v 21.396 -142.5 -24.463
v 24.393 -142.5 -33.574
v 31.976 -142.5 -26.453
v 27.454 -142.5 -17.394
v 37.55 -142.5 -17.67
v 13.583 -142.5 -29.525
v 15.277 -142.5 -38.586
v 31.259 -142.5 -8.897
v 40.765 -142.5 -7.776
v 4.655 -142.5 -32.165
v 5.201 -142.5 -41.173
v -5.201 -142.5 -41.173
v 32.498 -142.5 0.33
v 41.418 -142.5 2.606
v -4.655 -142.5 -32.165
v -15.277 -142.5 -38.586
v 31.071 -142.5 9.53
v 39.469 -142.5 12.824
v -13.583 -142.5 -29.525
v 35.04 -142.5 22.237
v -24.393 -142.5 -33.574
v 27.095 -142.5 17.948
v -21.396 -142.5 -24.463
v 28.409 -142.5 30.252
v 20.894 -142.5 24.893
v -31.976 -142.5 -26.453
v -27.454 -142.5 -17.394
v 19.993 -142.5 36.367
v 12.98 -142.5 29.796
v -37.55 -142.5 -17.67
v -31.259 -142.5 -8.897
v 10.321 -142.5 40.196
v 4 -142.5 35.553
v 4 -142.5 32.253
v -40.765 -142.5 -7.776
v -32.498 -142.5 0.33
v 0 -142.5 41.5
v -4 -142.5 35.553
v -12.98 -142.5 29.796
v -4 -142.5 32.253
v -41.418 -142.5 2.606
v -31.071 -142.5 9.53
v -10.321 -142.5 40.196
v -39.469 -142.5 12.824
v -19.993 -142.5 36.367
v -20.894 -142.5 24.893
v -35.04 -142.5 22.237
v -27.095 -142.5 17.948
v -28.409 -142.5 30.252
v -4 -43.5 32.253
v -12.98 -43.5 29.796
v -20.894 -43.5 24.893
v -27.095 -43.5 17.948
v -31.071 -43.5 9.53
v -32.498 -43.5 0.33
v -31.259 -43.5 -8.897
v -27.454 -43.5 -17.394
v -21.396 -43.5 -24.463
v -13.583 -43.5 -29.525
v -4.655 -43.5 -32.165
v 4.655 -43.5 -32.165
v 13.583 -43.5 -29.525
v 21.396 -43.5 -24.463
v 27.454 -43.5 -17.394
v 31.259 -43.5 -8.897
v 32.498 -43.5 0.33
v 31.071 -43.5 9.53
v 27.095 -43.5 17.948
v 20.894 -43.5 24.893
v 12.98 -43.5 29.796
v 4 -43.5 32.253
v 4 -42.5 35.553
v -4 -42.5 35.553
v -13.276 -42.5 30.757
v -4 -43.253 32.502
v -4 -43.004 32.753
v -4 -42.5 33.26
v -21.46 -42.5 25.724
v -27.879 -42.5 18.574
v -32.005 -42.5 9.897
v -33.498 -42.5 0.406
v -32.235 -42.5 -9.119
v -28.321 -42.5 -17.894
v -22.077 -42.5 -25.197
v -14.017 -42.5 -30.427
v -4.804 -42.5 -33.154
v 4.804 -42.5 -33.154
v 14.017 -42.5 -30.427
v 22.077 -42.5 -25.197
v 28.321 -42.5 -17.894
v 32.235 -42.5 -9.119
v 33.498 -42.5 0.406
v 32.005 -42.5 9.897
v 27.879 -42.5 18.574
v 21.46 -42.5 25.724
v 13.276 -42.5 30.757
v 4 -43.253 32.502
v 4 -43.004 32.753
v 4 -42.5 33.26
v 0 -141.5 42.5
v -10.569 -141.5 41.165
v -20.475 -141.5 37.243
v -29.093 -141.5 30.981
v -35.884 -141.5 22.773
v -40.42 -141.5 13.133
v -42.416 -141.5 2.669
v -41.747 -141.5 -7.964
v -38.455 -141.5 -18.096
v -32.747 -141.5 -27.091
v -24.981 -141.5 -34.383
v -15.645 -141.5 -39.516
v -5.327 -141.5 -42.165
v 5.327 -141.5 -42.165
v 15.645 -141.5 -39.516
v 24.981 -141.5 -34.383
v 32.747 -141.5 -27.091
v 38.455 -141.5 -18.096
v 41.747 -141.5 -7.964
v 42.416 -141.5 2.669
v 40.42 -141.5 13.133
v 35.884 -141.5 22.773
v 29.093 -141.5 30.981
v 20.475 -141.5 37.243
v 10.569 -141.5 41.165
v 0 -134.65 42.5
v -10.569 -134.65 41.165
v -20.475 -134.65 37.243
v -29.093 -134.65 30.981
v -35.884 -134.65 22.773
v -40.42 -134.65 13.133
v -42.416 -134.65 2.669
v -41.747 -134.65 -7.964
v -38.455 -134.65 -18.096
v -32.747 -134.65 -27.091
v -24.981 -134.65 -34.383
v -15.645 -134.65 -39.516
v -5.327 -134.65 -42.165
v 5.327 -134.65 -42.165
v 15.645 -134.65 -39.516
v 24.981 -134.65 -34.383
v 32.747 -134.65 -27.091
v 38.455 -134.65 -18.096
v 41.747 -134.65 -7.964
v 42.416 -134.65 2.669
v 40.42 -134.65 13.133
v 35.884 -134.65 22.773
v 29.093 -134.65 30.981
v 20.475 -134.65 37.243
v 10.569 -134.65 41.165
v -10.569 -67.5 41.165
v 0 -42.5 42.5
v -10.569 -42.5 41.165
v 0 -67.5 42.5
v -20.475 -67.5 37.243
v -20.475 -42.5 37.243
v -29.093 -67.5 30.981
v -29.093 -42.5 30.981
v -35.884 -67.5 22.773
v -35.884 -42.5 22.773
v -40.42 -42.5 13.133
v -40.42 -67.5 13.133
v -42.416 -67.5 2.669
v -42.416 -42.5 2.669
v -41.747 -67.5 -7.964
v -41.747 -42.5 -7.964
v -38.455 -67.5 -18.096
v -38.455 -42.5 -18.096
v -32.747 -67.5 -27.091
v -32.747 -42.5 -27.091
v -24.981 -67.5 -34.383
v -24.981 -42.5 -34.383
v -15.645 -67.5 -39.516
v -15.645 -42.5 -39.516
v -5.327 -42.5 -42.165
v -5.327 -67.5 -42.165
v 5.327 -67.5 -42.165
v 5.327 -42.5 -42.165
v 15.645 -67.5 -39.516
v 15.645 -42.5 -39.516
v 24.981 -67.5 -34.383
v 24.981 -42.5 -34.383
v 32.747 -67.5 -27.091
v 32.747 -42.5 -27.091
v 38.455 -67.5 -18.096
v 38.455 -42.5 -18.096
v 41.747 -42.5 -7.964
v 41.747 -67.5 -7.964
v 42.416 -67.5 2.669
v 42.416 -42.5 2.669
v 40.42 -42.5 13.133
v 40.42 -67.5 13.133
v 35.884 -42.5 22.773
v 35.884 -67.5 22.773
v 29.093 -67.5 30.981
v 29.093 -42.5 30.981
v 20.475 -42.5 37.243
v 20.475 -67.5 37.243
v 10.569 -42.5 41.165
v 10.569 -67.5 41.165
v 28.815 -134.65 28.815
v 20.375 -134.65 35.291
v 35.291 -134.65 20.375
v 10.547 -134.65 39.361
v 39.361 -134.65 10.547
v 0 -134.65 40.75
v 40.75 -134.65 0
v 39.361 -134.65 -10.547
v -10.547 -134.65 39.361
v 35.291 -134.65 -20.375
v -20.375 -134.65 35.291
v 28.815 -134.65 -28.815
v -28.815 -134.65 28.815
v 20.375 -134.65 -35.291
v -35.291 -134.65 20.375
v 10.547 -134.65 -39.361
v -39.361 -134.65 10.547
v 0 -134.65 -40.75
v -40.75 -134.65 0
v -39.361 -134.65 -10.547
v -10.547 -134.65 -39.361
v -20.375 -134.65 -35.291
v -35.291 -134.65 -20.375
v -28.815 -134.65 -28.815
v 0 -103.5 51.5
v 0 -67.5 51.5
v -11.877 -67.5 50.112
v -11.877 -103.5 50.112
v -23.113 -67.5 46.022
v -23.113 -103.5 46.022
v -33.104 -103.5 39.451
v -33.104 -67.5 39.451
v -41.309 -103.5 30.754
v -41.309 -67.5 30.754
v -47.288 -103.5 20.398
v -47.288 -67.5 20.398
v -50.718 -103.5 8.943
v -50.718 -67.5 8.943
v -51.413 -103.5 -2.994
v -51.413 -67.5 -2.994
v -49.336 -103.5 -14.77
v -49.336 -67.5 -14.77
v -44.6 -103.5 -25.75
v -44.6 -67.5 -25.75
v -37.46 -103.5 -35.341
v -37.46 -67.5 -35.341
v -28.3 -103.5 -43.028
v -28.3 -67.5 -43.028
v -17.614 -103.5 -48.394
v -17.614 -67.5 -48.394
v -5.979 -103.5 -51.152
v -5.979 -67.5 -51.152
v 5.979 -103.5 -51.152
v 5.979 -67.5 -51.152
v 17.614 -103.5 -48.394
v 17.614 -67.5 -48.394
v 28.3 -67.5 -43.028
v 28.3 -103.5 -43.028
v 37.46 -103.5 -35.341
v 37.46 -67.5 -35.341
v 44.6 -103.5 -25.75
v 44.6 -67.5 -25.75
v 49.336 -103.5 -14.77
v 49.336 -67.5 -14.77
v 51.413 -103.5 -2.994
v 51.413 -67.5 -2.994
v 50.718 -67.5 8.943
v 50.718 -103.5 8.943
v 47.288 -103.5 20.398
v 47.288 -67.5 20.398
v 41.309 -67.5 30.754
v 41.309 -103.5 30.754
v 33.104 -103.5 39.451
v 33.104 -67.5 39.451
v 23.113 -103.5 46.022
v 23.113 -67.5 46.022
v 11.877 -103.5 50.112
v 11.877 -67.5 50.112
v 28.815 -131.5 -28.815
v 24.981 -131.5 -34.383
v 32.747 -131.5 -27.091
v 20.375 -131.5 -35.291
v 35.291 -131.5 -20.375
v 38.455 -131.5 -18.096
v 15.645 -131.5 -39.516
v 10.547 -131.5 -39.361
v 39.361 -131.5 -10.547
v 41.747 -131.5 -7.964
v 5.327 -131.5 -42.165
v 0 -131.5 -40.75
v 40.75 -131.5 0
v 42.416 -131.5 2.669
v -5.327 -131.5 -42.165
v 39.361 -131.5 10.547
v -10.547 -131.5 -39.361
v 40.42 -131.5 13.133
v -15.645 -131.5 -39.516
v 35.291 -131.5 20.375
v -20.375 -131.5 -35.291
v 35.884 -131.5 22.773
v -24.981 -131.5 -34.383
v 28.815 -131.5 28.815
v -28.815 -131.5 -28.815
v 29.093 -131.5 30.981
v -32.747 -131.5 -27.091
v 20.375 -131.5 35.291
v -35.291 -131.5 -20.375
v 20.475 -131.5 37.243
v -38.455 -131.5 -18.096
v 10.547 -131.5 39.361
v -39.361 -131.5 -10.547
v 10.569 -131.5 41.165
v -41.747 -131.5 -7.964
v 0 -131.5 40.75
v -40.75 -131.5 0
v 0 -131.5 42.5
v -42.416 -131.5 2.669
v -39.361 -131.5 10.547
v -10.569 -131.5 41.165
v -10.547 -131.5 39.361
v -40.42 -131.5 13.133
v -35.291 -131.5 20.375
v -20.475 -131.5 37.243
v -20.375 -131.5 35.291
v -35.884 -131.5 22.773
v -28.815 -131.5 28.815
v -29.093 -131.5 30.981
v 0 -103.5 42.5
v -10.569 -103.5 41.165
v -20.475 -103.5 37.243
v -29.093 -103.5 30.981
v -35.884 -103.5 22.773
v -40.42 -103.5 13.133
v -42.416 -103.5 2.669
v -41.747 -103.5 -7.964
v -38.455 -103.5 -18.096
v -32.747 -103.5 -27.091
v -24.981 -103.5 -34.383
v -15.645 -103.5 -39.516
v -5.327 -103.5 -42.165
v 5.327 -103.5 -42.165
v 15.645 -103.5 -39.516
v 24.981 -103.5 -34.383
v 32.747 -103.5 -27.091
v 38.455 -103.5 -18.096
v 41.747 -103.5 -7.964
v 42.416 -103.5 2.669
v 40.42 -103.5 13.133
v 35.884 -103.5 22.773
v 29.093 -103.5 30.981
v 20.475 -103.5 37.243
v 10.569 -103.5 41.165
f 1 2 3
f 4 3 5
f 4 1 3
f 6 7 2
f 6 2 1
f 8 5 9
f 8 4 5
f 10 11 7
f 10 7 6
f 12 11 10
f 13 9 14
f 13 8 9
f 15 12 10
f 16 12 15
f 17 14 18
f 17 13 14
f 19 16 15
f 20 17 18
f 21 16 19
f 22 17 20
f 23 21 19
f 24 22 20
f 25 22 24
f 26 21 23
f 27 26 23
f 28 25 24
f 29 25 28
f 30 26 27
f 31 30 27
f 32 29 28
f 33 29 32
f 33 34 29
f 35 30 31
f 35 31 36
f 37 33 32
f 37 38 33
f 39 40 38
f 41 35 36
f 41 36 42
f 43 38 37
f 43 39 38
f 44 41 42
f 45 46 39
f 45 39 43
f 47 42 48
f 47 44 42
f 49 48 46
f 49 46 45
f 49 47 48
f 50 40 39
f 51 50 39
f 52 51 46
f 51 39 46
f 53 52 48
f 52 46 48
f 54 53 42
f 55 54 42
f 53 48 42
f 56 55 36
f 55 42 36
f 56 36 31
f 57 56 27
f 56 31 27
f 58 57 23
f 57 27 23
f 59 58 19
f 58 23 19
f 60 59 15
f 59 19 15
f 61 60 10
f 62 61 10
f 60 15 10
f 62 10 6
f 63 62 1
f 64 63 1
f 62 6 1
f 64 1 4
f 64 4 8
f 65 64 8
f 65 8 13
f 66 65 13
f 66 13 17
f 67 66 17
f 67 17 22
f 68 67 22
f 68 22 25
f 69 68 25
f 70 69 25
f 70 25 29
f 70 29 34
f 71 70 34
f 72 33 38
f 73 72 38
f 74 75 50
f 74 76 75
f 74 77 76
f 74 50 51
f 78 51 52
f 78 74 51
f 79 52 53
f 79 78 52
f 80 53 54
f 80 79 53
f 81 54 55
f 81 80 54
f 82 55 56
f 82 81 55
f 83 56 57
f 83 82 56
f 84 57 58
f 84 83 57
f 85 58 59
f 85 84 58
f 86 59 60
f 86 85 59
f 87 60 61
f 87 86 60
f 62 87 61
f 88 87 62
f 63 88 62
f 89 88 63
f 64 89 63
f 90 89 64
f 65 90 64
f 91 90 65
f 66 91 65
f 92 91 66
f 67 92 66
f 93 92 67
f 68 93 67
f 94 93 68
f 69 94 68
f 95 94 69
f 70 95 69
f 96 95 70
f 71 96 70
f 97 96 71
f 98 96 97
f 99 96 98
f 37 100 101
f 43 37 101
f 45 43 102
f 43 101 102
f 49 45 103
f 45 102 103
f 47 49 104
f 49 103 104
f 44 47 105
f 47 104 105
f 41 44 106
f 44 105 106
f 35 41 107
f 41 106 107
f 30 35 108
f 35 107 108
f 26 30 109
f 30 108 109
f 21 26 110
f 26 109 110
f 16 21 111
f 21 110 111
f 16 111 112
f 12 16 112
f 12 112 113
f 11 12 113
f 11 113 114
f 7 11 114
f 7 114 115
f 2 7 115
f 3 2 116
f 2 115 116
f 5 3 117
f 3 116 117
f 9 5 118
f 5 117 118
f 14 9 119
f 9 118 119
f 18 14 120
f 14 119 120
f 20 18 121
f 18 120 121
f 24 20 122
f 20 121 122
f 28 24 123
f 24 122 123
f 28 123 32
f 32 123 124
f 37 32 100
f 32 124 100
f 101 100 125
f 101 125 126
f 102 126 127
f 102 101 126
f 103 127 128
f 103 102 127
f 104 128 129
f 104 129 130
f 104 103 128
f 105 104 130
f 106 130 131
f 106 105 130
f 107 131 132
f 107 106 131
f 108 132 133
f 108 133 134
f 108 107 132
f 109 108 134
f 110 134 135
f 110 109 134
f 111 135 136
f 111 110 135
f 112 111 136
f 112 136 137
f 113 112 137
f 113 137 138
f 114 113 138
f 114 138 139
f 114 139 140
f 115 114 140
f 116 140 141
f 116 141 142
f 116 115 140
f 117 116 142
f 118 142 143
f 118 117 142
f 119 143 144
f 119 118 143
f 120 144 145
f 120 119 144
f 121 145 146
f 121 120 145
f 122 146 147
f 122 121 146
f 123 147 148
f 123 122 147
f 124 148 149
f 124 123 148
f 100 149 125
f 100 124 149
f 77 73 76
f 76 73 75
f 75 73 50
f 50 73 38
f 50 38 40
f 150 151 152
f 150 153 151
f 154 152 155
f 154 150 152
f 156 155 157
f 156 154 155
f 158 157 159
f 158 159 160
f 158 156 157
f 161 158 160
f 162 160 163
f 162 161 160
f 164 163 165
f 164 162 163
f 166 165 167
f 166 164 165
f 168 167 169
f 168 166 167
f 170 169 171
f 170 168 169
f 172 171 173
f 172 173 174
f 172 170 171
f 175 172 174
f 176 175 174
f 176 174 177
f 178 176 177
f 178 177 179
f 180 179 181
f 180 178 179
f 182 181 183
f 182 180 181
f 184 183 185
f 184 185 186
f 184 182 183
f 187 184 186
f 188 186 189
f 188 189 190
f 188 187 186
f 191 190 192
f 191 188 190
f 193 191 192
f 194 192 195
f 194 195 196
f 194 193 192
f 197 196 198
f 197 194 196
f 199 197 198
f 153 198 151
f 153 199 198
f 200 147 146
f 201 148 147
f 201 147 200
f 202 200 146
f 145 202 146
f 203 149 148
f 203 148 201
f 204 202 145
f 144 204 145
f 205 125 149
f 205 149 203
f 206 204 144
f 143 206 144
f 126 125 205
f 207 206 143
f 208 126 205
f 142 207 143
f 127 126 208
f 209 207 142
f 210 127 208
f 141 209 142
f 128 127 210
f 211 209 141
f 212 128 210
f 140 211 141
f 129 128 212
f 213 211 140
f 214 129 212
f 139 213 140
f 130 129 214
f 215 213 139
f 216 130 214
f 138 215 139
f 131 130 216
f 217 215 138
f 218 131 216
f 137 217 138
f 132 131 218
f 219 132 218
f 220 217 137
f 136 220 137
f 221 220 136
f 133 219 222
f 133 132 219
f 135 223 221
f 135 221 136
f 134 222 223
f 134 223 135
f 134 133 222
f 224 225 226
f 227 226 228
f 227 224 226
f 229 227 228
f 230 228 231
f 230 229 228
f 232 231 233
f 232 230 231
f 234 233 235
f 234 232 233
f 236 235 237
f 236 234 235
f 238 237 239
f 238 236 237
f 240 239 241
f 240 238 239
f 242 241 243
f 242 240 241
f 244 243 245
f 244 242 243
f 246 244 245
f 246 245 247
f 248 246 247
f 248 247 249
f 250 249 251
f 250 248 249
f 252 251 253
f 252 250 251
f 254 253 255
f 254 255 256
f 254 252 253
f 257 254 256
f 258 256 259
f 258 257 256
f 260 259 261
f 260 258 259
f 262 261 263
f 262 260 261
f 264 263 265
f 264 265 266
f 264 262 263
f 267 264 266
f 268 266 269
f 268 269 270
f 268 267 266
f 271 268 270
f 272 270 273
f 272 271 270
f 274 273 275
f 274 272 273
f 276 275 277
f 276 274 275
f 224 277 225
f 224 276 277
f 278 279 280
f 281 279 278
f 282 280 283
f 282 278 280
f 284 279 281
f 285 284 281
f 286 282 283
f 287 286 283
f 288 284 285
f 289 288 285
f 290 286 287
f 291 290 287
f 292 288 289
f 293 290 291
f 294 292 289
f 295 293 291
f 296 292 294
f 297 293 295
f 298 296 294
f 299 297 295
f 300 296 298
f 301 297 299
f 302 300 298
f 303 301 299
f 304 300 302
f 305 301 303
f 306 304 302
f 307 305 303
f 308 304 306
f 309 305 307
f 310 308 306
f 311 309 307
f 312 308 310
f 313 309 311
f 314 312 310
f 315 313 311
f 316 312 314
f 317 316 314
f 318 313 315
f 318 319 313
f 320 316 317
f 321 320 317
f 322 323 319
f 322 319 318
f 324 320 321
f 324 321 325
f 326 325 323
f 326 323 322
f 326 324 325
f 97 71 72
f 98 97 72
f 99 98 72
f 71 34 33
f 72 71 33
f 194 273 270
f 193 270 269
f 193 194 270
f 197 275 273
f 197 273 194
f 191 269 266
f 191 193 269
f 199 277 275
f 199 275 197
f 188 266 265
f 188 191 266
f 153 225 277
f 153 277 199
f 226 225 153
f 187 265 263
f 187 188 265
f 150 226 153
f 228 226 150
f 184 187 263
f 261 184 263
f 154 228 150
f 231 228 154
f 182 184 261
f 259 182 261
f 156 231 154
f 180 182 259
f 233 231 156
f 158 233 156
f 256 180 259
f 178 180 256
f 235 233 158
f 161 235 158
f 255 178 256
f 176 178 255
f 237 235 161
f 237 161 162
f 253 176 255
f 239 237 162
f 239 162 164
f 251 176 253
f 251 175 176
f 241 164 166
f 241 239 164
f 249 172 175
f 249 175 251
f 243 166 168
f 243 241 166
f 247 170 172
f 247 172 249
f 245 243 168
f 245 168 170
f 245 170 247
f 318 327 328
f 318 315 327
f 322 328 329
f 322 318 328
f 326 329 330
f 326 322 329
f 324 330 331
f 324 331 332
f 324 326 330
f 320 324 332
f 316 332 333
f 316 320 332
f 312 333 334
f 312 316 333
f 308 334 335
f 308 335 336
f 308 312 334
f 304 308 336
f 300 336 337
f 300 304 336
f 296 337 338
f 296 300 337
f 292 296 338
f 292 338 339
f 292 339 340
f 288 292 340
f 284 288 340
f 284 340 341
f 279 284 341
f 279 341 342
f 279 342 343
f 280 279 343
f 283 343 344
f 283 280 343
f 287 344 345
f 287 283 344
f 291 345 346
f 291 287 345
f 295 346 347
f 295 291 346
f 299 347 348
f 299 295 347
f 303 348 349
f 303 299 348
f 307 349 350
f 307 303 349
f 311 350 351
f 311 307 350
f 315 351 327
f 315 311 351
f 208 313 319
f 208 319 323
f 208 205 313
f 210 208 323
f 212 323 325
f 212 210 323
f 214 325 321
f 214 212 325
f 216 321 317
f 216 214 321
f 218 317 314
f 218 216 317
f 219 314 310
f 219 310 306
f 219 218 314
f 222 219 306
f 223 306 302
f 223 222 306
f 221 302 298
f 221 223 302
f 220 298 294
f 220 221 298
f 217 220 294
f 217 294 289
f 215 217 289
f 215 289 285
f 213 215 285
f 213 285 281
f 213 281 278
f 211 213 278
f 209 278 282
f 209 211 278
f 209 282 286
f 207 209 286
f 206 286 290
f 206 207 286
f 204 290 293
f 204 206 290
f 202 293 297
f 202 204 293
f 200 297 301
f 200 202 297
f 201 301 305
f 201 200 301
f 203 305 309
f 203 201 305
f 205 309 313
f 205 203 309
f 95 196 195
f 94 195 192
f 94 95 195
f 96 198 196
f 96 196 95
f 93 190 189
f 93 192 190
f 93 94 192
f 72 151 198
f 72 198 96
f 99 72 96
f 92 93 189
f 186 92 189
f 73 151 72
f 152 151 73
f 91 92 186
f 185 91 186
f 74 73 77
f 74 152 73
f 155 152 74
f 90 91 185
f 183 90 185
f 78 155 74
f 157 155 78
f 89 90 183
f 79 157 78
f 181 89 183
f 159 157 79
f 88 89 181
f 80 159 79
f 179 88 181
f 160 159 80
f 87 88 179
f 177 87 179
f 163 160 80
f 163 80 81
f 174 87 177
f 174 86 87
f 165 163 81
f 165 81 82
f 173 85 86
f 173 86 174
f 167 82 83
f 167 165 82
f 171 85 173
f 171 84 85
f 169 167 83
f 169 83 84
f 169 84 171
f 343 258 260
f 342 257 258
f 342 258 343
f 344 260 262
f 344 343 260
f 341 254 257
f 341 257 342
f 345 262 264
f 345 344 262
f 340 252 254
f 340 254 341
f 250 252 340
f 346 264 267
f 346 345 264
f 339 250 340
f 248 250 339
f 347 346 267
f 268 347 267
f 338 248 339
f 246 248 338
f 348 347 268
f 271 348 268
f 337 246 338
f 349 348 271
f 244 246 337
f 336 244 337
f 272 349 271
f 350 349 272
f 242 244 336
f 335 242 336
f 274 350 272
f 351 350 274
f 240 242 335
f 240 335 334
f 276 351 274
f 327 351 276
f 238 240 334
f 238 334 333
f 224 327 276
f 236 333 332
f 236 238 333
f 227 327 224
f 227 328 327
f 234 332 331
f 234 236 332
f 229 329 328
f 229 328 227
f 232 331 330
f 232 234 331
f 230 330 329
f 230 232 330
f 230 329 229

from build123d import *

# Parameters (mm, degrees)
F4_DEPTH = 100.001
F5_SIZE  = 1


with BuildPart() as f1:
    # F0 (on Right) → F1 (revolve)
    with BuildSketch(Plane.YZ):
        Polygon((-142.5, 42.5), (-142.5, 0), (-42.5, 0), (-42.5, 42.5), (-67.5, 42.5), (-67.5, 51.5), (-103.5, 51.5), (-103.5, 42.5), (-131.5, 42.5), (-131.5, 40.75), (-134.65, 40.75), (-134.65, 42.5), align=None)
    revolve(axis=Axis((0, -92.5, 0), (0, -1, 0)))

    # F3 (on face) → F4 (cut, through all)
    with BuildSketch(Plane.XZ.offset(142.5)):
        with BuildLine():
            Line((-4, 35.5529068457), (-4, 32.2529068457))
            ThreePointArc((-4, 32.2529068457), (0, -32.5), (4, 32.2529068457))
            Line((4, 32.2529068457), (4, 35.5529068457))
            Line((4, 35.5529068457), (-4, 35.5529068457))
        make_face()
    extrude(amount=-F4_DEPTH, mode=Mode.SUBTRACT)

    # F5
    f5_edges = [f1.edges().sort_by_distance(p)[0] for p in [
        (0, -142.5, -42.5),
        (0, -42.5, -32.5),
    ]]
    chamfer(f5_edges, length=F5_SIZE)


solid = f1.part
